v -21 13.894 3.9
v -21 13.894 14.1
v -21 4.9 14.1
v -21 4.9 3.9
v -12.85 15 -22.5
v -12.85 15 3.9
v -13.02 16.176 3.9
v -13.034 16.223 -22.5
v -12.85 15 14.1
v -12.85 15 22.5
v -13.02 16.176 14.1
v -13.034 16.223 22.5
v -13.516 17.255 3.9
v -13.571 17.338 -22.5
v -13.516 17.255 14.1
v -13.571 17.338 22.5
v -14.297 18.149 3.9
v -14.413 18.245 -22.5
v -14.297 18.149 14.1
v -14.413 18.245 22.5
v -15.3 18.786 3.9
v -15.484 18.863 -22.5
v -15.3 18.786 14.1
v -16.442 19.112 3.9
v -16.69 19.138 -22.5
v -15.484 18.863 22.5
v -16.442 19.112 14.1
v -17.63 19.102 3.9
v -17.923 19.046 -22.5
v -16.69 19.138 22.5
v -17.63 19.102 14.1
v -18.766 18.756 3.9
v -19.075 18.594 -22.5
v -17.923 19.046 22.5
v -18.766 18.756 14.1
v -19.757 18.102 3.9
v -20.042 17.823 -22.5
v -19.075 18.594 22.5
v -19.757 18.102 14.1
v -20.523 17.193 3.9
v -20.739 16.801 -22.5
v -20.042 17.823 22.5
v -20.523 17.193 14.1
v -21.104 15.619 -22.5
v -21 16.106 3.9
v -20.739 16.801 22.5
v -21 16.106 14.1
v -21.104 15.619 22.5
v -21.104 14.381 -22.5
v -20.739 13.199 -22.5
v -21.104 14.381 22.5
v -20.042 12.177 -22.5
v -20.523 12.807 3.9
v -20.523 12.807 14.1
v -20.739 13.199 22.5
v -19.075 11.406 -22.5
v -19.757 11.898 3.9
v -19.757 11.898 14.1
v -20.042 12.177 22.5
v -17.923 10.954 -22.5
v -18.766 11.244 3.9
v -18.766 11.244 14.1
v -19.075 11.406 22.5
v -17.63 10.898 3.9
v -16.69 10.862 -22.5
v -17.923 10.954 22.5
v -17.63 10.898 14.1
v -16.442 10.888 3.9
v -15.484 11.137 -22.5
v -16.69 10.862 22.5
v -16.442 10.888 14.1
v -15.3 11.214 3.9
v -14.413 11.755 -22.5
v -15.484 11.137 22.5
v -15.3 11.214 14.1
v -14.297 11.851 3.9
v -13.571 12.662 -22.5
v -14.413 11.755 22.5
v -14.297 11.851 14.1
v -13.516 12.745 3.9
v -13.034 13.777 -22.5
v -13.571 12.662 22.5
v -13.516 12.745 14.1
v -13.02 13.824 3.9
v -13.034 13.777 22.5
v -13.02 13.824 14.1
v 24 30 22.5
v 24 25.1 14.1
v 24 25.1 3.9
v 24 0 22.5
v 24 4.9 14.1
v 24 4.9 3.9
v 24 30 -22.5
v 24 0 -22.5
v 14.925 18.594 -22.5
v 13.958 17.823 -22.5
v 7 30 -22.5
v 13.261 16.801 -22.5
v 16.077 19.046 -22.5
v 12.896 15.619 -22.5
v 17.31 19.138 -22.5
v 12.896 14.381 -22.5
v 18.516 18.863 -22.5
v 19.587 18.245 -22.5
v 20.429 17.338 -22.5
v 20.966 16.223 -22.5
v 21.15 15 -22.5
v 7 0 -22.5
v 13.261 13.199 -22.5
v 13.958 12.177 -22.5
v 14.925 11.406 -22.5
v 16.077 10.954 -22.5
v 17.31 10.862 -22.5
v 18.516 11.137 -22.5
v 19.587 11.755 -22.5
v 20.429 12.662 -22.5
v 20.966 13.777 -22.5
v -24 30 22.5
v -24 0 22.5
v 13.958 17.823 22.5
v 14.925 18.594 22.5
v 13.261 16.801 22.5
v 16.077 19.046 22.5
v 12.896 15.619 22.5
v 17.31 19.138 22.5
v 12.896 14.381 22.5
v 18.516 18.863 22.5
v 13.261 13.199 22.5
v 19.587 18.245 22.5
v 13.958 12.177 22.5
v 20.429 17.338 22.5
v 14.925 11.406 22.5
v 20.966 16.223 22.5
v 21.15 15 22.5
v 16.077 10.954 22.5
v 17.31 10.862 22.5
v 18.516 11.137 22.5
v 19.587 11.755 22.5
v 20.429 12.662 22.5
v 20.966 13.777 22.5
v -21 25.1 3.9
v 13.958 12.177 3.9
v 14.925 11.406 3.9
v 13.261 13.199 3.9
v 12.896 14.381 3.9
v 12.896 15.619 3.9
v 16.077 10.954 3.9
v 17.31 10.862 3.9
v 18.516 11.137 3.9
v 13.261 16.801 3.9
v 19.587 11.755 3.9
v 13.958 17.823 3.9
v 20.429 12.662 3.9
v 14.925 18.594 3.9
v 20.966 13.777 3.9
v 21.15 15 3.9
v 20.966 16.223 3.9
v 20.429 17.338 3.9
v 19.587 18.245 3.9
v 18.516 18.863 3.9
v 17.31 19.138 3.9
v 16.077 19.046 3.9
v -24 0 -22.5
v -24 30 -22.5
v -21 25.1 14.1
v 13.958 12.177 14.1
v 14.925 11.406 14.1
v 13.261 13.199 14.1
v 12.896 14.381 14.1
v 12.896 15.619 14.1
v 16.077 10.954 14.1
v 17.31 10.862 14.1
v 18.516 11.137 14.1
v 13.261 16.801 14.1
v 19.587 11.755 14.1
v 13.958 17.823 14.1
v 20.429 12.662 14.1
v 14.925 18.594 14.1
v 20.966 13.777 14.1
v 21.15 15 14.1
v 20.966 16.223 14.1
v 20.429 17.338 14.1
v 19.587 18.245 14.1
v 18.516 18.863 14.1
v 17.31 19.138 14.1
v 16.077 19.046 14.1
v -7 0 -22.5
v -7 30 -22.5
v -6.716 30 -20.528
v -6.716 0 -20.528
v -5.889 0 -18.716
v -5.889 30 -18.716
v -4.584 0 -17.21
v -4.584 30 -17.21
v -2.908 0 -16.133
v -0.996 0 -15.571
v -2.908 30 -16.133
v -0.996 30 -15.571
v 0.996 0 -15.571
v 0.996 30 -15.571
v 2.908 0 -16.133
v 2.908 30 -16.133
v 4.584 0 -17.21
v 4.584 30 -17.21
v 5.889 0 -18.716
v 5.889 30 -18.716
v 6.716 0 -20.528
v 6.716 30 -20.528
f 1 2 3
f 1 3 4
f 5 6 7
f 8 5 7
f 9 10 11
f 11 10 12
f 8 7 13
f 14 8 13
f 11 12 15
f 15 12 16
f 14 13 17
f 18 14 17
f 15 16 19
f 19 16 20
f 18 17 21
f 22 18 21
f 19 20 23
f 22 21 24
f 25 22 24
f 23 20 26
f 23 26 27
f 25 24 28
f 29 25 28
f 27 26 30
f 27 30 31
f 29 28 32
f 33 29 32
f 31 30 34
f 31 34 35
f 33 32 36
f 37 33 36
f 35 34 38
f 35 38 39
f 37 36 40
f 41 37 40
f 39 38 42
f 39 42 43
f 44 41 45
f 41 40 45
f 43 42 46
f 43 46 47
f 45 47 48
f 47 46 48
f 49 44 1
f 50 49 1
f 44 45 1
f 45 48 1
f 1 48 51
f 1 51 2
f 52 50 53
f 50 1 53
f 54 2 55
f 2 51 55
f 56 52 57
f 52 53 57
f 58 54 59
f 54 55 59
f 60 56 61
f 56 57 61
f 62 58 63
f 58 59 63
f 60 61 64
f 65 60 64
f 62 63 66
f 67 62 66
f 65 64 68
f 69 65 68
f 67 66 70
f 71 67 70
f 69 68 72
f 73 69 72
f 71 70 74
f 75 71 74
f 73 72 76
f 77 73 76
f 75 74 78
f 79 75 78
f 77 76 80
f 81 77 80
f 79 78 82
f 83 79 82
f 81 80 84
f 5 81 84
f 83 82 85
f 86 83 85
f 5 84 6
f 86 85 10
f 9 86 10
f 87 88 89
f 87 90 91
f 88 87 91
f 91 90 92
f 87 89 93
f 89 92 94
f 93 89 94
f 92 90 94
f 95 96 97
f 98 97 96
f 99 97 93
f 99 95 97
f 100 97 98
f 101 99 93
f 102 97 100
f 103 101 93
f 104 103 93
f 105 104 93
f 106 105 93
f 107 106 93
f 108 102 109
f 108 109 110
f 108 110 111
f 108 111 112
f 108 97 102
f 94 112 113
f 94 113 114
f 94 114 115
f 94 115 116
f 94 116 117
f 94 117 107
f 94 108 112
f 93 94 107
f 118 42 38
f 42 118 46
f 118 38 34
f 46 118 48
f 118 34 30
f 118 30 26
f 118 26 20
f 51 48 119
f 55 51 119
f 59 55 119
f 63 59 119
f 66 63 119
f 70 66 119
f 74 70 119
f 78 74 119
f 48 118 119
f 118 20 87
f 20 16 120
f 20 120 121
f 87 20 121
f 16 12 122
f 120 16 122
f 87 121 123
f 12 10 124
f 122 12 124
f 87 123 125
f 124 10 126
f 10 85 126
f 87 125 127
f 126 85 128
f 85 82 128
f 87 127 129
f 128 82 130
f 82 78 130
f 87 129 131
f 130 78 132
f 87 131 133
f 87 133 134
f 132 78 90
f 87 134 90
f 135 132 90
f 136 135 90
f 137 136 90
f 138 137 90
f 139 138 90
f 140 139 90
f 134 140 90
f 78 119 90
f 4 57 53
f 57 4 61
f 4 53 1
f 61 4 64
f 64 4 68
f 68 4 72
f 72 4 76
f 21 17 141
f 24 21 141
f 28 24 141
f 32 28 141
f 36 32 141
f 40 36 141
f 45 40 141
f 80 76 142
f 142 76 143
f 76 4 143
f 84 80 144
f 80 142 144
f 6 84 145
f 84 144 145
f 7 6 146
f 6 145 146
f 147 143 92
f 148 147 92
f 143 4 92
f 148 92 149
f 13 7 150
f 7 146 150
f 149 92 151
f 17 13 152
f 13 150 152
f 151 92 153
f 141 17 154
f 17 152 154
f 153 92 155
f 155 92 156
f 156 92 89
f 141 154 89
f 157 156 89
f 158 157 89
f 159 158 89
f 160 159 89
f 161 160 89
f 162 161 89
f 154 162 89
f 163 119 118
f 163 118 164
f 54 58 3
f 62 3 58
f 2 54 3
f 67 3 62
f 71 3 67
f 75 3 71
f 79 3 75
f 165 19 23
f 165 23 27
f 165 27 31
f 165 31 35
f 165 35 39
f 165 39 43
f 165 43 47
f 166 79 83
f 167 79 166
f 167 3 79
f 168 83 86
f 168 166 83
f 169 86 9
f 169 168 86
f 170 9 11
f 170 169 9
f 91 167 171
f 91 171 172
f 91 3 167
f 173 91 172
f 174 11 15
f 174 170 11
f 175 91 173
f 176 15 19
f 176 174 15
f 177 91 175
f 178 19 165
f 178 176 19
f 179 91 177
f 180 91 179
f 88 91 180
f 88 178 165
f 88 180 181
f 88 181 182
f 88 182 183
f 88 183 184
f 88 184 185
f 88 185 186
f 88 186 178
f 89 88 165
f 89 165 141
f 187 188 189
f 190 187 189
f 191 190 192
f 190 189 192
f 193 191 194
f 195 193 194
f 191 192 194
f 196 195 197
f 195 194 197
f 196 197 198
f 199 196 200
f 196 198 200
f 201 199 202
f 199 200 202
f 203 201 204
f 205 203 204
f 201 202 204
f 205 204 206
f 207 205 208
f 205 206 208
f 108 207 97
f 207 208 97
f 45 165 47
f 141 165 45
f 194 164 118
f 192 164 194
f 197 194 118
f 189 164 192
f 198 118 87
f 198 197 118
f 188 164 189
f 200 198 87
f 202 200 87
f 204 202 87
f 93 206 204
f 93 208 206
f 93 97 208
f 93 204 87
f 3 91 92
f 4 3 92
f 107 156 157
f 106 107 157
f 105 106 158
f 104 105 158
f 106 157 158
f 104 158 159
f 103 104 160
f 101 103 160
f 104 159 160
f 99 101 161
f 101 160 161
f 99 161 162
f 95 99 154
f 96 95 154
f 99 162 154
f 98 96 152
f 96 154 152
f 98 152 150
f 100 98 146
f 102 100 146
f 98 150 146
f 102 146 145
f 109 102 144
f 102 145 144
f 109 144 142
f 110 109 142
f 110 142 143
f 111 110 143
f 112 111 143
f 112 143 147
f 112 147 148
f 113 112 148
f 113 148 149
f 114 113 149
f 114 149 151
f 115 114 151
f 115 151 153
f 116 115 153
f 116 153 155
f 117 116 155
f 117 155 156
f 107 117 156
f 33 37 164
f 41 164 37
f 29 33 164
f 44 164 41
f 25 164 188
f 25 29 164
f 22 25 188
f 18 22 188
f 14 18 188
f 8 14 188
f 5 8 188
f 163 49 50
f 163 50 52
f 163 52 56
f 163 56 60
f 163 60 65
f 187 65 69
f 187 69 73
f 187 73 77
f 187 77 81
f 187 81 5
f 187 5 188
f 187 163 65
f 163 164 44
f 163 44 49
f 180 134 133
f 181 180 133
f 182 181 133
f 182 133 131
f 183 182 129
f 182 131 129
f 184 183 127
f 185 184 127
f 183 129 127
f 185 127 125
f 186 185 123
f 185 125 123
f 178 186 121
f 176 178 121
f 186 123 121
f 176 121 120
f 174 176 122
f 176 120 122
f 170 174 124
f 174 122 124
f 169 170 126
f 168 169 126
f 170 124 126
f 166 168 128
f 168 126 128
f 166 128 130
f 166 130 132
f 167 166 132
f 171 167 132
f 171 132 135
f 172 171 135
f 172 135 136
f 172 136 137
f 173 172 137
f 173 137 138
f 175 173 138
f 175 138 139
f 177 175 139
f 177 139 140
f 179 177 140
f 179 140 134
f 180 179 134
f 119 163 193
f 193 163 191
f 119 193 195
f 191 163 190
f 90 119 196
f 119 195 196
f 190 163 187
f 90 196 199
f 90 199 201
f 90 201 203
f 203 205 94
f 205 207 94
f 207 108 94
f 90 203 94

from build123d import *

# Parameters (mm, degrees)
SKETCH1_W               = 48
SKETCH1_H               = 45
BOSS_EXTRUDE1_DEPTH     = 30
SKETCH2_W               = 10.2
SKETCH2_H               = 20.2
CUT_EXTRUDE1_DEPTH      = 45
SKETCH3_R               = 4.15
CUT_EXTRUDE2_DEPTH      = 46
CUT_EXTRUDE3_DEPTH      = 1
CUT_EXTRUDE3_DEPTH_BACK = 31


with BuildPart() as part:
    # Sketch1 → Boss-Extrude1 (new body)
    with BuildSketch(Plane(origin=(0, 0, 0), x_dir=(1, 0, 0), z_dir=(0, 1, 0))):
        Rectangle(SKETCH1_W, SKETCH1_H)
    extrude(amount=BOSS_EXTRUDE1_DEPTH)

    # Sketch2 → Cut-Extrude1 (cut)
    with BuildSketch(Plane(origin=(24, 0, 0), x_dir=(0, 0, -1), z_dir=(1, 0, 0))):
        with Locations((-9, 15)):
            Rectangle(SKETCH2_W, SKETCH2_H)
    extrude(amount=-CUT_EXTRUDE1_DEPTH, mode=Mode.SUBTRACT)

    # Sketch3 → Cut-Extrude2 (cut, through all)
    with BuildSketch(Plane.XY.offset(22.5)):
        with Locations((-17, 15)):
            Circle(SKETCH3_R)
        with Locations((17, 15)):
            Circle(SKETCH3_R)
    extrude(amount=-CUT_EXTRUDE2_DEPTH, mode=Mode.SUBTRACT)

    # Sketch4 → Cut-Extrude3 (cut, two sides)
    with BuildSketch(Plane(origin=(0, 30, 0), x_dir=(1, 0, 0), z_dir=(0, 1, 0))) as cut_extrude3_sk:
        with BuildLine():
            Line((-7, 141.788608739), (-7, 22.5))
            ThreePointArc((-7, 22.5), (0, 15.5), (7, 22.5))
            Line((7, 22.5), (7, 141.788608739))
            Line((7, 141.788608739), (7, 380.365826216))
            Line((7, 380.365826216), (-7, 380.365826216))
            Line((-7, 380.365826216), (-7, 141.788608739))
        make_face()
    extrude(amount=CUT_EXTRUDE3_DEPTH, mode=Mode.SUBTRACT)
    extrude(cut_extrude3_sk.sketch, amount=-CUT_EXTRUDE3_DEPTH_BACK, mode=Mode.SUBTRACT)


solid = part.part
